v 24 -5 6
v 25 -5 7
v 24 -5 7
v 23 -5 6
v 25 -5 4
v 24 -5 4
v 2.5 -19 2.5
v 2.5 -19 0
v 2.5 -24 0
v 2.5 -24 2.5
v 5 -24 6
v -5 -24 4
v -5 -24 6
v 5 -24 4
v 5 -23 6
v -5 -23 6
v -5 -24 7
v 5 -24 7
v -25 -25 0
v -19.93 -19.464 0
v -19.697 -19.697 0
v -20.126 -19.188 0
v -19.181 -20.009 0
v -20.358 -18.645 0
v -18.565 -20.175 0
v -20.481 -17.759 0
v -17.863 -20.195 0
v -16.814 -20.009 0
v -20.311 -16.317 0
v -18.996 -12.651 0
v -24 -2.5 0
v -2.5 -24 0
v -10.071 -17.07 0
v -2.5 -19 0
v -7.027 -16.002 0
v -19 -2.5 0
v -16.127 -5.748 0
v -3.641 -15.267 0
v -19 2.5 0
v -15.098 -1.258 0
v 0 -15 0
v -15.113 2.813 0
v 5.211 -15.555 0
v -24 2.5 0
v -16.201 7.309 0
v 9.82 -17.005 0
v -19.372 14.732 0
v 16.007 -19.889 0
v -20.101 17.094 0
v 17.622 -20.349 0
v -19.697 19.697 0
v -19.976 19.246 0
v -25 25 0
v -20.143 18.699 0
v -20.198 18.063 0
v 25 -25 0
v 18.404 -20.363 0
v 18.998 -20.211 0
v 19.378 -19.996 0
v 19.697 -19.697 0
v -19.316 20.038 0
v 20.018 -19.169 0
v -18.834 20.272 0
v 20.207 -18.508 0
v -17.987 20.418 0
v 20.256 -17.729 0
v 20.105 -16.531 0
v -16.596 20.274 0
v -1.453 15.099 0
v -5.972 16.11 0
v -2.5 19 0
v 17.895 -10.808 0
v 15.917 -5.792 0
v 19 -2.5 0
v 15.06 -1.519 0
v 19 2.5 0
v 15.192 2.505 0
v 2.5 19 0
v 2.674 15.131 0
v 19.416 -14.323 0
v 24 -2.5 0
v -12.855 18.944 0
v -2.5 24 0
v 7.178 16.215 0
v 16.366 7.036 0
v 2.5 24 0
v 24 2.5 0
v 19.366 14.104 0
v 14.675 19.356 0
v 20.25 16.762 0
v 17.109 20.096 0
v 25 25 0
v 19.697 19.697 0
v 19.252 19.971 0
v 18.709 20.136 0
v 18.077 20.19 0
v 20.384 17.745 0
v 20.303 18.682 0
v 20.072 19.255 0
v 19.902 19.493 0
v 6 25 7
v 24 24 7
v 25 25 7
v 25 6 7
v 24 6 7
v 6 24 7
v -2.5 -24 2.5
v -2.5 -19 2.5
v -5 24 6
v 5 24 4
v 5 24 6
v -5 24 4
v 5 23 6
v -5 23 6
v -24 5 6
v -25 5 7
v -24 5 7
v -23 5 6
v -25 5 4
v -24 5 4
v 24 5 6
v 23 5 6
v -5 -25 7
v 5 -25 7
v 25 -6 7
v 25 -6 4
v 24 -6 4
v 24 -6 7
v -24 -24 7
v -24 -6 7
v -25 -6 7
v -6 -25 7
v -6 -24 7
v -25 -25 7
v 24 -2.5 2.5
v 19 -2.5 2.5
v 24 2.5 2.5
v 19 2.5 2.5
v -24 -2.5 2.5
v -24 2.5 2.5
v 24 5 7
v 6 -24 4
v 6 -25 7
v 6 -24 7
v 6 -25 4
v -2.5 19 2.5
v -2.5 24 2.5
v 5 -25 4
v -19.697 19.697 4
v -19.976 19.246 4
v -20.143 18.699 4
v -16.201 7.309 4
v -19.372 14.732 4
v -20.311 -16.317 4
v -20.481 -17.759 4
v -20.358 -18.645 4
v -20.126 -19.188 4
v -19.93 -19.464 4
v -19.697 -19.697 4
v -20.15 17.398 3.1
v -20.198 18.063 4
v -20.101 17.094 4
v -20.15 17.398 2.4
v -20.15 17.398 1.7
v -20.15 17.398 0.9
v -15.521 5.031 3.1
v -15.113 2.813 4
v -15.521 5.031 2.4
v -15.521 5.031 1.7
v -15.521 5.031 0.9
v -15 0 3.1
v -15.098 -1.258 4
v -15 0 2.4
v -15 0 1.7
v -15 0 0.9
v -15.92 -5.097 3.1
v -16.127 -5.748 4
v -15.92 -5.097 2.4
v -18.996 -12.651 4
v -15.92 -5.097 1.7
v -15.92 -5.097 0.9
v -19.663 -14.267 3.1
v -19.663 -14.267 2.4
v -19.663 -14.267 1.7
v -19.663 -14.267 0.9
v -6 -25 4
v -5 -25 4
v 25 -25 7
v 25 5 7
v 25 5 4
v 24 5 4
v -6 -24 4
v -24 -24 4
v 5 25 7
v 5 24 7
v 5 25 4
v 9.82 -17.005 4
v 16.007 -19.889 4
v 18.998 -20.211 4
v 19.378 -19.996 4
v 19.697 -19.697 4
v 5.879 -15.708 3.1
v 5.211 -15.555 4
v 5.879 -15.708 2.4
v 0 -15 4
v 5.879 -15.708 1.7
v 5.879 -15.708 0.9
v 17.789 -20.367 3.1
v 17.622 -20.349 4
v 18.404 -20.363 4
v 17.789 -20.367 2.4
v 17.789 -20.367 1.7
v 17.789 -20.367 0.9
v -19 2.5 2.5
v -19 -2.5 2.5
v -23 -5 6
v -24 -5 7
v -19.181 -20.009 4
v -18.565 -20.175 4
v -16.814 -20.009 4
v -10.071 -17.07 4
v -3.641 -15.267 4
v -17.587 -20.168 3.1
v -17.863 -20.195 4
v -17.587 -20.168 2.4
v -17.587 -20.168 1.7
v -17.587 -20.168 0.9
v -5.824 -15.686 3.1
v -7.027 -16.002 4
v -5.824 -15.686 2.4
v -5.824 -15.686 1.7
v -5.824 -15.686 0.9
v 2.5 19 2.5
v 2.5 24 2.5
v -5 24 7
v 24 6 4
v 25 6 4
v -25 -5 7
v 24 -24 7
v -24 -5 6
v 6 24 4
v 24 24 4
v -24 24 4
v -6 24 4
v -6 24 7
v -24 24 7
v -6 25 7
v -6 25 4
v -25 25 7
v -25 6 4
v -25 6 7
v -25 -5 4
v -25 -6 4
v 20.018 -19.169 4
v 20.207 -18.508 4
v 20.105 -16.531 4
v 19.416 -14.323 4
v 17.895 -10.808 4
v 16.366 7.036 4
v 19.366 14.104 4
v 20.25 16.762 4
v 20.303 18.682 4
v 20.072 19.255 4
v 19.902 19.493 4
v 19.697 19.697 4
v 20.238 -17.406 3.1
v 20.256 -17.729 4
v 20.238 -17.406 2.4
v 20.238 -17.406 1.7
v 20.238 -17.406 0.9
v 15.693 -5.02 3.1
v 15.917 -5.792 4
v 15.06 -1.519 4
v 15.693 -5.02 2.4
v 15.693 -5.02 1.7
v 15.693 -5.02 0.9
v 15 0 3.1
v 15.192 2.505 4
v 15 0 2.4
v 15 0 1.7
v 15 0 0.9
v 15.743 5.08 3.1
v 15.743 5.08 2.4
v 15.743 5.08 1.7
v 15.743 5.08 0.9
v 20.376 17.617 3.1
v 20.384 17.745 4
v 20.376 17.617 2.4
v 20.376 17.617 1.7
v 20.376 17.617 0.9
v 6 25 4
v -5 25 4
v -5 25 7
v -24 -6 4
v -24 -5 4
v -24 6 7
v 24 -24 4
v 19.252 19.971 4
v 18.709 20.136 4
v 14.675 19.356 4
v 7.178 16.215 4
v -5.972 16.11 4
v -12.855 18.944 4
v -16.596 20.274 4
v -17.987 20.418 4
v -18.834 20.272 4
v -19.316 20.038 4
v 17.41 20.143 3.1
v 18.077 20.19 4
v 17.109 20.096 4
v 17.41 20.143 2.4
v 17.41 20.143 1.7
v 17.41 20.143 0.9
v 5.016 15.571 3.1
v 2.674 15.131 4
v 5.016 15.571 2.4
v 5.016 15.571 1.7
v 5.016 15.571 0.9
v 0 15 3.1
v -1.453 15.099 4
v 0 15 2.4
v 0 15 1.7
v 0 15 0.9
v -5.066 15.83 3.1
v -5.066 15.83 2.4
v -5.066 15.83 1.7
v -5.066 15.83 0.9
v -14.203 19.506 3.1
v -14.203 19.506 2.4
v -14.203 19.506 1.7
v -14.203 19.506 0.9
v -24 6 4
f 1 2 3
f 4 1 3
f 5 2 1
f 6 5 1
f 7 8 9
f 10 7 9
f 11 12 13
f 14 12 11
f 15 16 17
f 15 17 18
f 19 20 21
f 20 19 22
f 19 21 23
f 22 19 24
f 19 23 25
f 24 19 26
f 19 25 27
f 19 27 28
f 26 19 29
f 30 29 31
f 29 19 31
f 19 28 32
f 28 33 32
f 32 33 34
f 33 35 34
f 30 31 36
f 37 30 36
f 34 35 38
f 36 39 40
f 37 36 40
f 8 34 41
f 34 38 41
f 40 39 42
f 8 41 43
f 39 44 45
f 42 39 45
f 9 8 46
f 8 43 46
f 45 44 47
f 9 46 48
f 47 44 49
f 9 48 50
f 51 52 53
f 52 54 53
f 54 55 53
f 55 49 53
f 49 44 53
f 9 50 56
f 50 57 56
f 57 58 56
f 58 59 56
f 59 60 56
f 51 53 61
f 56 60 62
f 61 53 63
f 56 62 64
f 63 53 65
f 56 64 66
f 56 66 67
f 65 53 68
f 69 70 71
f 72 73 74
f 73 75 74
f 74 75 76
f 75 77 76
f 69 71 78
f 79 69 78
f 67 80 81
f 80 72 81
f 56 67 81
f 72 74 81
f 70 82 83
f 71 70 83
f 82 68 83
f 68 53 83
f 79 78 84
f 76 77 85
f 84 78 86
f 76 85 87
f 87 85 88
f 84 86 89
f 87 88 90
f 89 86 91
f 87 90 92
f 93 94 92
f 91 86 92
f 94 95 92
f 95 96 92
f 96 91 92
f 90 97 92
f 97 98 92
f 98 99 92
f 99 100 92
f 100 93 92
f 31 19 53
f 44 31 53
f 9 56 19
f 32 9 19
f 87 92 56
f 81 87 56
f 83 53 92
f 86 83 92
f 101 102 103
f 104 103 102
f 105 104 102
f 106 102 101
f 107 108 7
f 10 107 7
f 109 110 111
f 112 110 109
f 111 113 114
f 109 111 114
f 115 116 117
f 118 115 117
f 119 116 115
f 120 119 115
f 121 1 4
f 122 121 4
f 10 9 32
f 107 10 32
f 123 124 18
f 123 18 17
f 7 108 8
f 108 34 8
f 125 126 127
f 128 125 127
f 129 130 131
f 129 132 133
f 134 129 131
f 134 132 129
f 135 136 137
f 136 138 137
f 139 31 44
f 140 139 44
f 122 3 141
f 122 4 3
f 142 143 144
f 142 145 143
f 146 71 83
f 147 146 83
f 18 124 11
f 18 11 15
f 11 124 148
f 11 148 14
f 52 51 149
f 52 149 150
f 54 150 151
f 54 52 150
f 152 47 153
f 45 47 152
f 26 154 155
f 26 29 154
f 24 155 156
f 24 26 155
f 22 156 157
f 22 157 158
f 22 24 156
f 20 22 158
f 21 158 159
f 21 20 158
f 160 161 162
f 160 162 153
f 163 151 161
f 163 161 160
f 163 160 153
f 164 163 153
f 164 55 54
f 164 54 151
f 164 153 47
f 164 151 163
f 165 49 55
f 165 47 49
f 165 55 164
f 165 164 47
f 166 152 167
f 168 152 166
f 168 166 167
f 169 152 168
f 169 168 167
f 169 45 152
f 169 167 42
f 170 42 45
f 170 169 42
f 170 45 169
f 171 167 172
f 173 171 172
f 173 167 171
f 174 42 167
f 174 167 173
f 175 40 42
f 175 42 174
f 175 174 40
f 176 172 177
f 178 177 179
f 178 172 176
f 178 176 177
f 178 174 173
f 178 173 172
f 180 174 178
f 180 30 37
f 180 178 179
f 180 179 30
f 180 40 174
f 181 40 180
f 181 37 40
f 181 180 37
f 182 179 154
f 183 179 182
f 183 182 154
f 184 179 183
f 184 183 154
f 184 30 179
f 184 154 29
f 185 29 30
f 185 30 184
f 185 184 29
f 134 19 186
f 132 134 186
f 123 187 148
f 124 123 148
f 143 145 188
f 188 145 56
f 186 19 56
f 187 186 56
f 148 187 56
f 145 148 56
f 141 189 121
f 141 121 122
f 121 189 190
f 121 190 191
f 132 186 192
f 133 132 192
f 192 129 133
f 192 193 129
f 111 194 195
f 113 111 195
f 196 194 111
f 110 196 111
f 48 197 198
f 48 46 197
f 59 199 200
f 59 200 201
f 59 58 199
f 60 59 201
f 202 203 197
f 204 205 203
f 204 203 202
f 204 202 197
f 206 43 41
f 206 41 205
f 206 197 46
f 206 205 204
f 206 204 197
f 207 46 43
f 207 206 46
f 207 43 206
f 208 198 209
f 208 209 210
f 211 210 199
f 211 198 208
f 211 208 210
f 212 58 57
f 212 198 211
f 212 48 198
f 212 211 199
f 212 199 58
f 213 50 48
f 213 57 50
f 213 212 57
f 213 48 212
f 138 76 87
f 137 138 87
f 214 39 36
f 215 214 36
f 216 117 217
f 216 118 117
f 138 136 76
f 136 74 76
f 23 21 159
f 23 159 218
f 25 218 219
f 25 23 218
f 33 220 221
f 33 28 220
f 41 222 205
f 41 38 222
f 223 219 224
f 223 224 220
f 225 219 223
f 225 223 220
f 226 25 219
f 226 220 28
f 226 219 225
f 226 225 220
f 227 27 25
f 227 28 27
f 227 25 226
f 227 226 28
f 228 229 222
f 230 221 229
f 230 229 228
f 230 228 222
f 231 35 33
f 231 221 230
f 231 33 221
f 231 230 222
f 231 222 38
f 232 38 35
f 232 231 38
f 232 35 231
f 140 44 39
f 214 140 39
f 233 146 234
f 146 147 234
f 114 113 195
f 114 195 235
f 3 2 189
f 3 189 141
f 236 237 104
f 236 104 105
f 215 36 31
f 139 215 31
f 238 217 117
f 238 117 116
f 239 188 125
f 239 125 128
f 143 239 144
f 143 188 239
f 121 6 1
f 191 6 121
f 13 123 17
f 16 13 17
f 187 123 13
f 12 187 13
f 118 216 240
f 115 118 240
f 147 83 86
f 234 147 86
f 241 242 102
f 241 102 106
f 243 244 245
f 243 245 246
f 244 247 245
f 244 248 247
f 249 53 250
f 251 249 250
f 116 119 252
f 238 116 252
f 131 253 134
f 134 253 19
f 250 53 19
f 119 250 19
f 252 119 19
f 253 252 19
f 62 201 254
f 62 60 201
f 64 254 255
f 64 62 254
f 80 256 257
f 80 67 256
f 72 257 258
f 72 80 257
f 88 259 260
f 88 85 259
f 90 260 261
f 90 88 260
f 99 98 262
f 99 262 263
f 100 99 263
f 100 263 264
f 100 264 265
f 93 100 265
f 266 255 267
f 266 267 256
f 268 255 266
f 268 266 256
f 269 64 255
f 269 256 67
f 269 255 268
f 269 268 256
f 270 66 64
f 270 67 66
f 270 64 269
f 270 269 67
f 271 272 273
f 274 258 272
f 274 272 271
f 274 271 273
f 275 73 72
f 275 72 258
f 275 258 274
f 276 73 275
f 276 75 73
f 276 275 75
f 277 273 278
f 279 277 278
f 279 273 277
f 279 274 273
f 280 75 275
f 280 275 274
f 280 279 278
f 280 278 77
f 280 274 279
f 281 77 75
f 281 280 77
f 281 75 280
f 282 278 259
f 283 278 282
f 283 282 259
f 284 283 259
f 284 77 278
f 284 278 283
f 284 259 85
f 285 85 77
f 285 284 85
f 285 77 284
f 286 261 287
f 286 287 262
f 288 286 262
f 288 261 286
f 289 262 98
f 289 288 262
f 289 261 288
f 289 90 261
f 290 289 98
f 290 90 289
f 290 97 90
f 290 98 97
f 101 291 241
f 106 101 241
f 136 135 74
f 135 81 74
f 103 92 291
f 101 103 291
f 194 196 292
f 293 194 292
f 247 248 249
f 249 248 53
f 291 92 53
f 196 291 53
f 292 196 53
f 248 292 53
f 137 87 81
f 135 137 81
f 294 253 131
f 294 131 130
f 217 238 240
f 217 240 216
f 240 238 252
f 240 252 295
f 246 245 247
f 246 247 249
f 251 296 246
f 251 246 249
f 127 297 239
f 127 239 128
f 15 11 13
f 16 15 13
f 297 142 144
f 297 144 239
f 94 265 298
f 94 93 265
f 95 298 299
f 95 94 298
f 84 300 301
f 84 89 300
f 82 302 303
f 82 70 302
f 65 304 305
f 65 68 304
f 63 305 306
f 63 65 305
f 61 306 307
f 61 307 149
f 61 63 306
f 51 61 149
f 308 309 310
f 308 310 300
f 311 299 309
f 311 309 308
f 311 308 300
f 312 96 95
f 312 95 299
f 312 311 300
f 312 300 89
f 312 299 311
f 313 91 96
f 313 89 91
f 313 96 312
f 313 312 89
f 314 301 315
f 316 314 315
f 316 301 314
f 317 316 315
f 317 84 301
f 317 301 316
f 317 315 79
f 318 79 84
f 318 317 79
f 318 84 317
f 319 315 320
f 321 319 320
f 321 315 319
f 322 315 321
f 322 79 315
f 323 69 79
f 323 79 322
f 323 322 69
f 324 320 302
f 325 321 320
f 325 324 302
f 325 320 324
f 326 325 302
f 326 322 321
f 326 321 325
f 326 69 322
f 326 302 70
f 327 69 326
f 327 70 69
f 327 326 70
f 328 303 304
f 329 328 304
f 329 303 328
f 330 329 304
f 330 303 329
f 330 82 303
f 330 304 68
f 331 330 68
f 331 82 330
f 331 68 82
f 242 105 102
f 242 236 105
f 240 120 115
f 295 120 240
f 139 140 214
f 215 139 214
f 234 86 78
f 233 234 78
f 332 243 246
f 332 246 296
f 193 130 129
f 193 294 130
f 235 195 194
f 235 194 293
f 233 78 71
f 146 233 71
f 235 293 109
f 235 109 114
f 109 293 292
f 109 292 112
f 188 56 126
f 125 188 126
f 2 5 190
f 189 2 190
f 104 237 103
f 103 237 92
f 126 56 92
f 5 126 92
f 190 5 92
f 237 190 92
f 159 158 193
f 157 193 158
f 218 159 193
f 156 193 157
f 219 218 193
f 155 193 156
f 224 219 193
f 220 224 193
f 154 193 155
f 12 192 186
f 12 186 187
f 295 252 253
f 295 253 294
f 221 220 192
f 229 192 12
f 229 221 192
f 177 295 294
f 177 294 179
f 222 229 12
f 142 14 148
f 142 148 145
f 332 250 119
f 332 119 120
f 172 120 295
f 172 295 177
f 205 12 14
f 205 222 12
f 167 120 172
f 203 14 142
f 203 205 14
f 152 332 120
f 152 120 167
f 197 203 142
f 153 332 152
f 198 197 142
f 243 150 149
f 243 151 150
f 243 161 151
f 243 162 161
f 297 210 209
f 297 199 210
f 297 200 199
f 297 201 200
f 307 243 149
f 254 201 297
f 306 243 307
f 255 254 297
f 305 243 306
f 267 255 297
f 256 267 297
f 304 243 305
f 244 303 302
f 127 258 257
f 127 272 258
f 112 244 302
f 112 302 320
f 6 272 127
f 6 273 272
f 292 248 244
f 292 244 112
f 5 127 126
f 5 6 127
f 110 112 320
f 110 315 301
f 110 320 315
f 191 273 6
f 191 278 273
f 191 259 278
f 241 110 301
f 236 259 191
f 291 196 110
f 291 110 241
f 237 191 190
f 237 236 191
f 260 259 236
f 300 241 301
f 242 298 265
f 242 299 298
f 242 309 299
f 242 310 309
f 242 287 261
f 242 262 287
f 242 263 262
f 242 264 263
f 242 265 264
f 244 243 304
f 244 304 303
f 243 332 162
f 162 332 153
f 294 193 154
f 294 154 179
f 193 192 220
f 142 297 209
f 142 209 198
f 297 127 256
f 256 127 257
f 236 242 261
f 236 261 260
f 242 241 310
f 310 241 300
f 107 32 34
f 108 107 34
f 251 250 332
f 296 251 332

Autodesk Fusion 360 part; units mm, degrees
sketch "Skizze1" plane through (0, 0, 0) normal (0, 0, 1) x (1, 0, 0)
  line L0 (25, 25) -> (-25, 25)
  line L1 (-25, 25) -> (-25, -25)
  line L2 (-25, -25) -> (25, -25)
  line L3 (25, -25) -> (25, 25)
  line L4 (25, 25) -> (-25, -25) construction
  line L5 (-25, 25) -> (25, -25) construction
  line L6 (0, 25) -> (0, 21.5) construction
  circle A0 centre (0, 21.5) radius 2.5
  circle A1 centre (-21.5, 0) radius 2.5
  circle A2 centre (0, -21.5) radius 2.5
  circle A3 centre (21.5, 0) radius 2.5
  line L7 (-25, 25) -> (-19.6967, 19.6967)
  line L8 (25, 25) -> (19.6967, 19.6967)
  line L9 (25, -25) -> (19.6967, -19.6967)
  line L10 (-25, -25) -> (-19.6967, -19.6967)
  line L11 (0, 25) -> (0, 15) construction
  line L12 (25, 0) -> (15, 0) construction
  line L13 (0, -25) -> (0, -15) construction
  line L14 (-25, 0) -> (-15, 0) construction
  spline S0 degree 5 poles (0, -15) (1.2065, -15) (3.6254, -15.1465) (7.1572, -15.8132) (11.2047, -17.4413) (15.1309, -19.6326) (18.0012, -20.8352) (20.0511, -20.1301) (20.6752, -17.6735) (19.5115, -14.1604) (17.3962, -9.8731) (15.4021, -5.0946) (14.5897, -0.0184) (15.4512, 5.1337) (17.4986, 10.0731) (19.6685, 14.4705) (20.838, 17.9349) (20.126, 20.1337) (17.6793, 20.5662) (14.1665, 19.2783) (9.8729, 17.155) (5.088, 15.2723) (0.0153, 14.6011) (-5.1205, 15.5565) (-10.0405, 17.6249) (-14.4307, 19.7595) (-17.9076, 20.8718) (-20.1386, 20.1183) (-20.5833, 17.6619) (-19.2644, 14.1613) (-17.1004, 9.8864) (-15.2073, 5.1088) (-14.5882, 0.0204) (-15.6493, -5.152) (-17.8106, -10.1075) (-19.9406, -14.5038) (-20.9509, -17.9505) (-20.0386, -20.1219) (-17.7519, -20.5757) (-14.8416, -19.3727) (-11.0208, -17.3175) (-7.0919, -15.7983) (-3.6135, -15.1465) (-1.2065, -15) (0, -15) knots 0 0 0 0 0 0 0.025 0.05 0.075 0.1 0.125 0.15 0.175 0.2 0.225 0.25 0.275 0.3 0.325 0.35 0.375 0.4 0.425 0.45 0.475 0.5 0.525 0.55 0.575 0.6 0.625 0.65 0.675 0.7 0.725 0.75 0.775 0.8 0.825 0.85 0.875 0.9 0.925 0.95 0.975 1 1 1 1 1 1
  line L15 (-21.5565, -18.1362) -> (-17.8369, -21.2572)
  line L16 (-8.8743, -15) -> (8.8743, -15)
  line L17 (21.5565, 18.1362) -> (17.8369, 21.2572)
  line L18 (18.1362, -21.5565) -> (21.2572, -17.8369)
  line L19 (-18.1127, 21.5869) -> (-21.2807, 17.8065)
  line L20 (2.5, 19) -> (-2.5, 19)
  line L21 (-2.5, 19) -> (-2.5, 24)
  line L22 (-2.5, 24) -> (2.5, 24)
  line L23 (2.5, 24) -> (2.5, 19)
  line L24 (2.5, 19) -> (-2.5, 24) construction
  line L25 (-2.5, 19) -> (2.5, 24) construction
  line L26 (-19, 2.5) -> (-19, -2.5)
  line L27 (-24, 2.5) -> (-19, 2.5)
  line L28 (-24, -2.5) -> (-24, 2.5)
  line L29 (-19, -2.5) -> (-24, -2.5)
  line L30 (-2.5, -19) -> (2.5, -19)
  line L31 (-2.5, -24) -> (-2.5, -19)
  line L32 (2.5, -24) -> (-2.5, -24)
  line L33 (2.5, -19) -> (2.5, -24)
  line L34 (19, -2.5) -> (19, 2.5)
  line L35 (24, -2.5) -> (19, -2.5)
  line L36 (24, 2.5) -> (24, -2.5)
  line L37 (19, 2.5) -> (24, 2.5)
  point P0 (0, 21.5)
  dimension "d1" = 50
  dimension "d2" = 50
  dimension "d4" = 5
  dimension "d6" = 360
  dimension "d7" = 7.5
  dimension "d8" = 7.5
  dimension "d9" = 7.5
  dimension "d10" = 7.5
  dimension "d11" = 10
  dimension "d12" = 10
  dimension "d13" = 10
  dimension "d14" = 10
  dimension "d39" = 5
  dimension "d40" = 5
  dimension "d42" = 360
  dimension "d43" = 3.5
extrude "Extrusion1" add sketch "Skizze1" along normal blind 4 contours L0 L7 L8 S0 | L3 L8 L9 S0 | L1 L7 L10 S0 | L2 L9 L10 S0 | A0 | A0 L20 L23 | A0 L22 L23 | A0 L21 L22 | A0 L20 L21 | A1 | A1 L26 L29 | A1 L26 L27 | A1 L27 L28 | A1 L28 L29 | A2 | A2 L32 L33 | A2 L30 L33 | A2 L30 L31 | A2 L31 L32 | A3 | A3 L35 L36 | A3 L36 L37 | A3 L34 L37 | A3 L34 L35
sketch "Skizze9" plane through (0, 0, 4) normal (0, 0, 1) x (-1, 0, 0)
  spline S0 degree 5 poles (0, 15) (1.2065, 15) (3.6135, 15.1465) (7.0919, 15.7983) (11.0208, 17.3175) (14.8416, 19.3727) (17.7519, 20.5757) (20.0386, 20.1219) (20.9509, 17.9505) (19.9406, 14.5038) (17.8106, 10.1075) (15.6493, 5.152) (14.5882, -0.0204) (15.2073, -5.1088) (17.1004, -9.8864) (19.2644, -14.1613) (20.5833, -17.6619) (20.1386, -20.1183) (17.9076, -20.8718) (14.4307, -19.7595) (10.0405, -17.6249) (5.1205, -15.5565) (-0.0153, -14.6011) (-5.088, -15.2723) (-9.8729, -17.155) (-14.1665, -19.2783) (-17.6793, -20.5662) (-20.126, -20.1337) (-20.838, -17.9349) (-19.6685, -14.4705) (-17.4986, -10.0731) (-15.4512, -5.1337) (-14.5897, 0.0184) (-15.4021, 5.0946) (-17.3962, 9.8731) (-19.5115, 14.1604) (-20.6752, 17.6735) (-20.0511, 20.1301) (-18.0012, 20.8352) (-15.1309, 19.6326) (-11.2047, 17.4413) (-7.1572, 15.8132) (-3.6254, 15.1465) (-1.2065, 15) (0, 15) knots -1 -1 -1 -1 -1 -1 -0.975 -0.95 -0.925 -0.9 -0.875 -0.85 -0.825 -0.8 -0.775 -0.75 -0.725 -0.7 -0.675 -0.65 -0.625 -0.6 -0.575 -0.55 -0.525 -0.5 -0.475 -0.45 -0.425 -0.4 -0.375 -0.35 -0.325 -0.3 -0.275 -0.25 -0.225 -0.2 -0.175 -0.15 -0.125 -0.1 -0.075 -0.05 -0.025 0 0 0 0 0 0
  line L0 (-25, 25) -> (-25, -25)
  line L1 (-25, -25) -> (25, -25)
  line L2 (25, -25) -> (25, 25)
  line L3 (25, 25) -> (-25, 25)
  line L4 (24, 24) -> (-24, 24)
  line L5 (-24, 24) -> (-24, -24)
  line L6 (-24, -24) -> (24, -24)
  line L7 (24, -24) -> (24, 24)
  line L8 (0, -25) -> (-5, -25)
  line L9 (-5, -25) -> (-5, -24)
  line L10 (-5, -25) -> (-6, -25)
  line L11 (-6, -25) -> (-6, -24)
  line L12 (0, -25) -> (0, -24) construction
  line L13 (6, -25) -> (6, -24)
  line L14 (5, -25) -> (5, -24)
  line L15 (5, -24) -> (-5, -24)
  line L16 (-5, -24) -> (-5, -23)
  line L17 (-5, -23) -> (5, -23)
  line L18 (5, -23) -> (5, -24)
  line L19 (25, 6) -> (24, 6)
  line L20 (25, 5) -> (24, 5)
  line L21 (23, 5) -> (24, 5)
  line L22 (23, -5) -> (23, 5)
  line L23 (25, -5) -> (24, -5)
  line L24 (25, -6) -> (24, -6)
  line L25 (24, -5) -> (23, -5)
  line L26 (-6, 25) -> (-6, 24)
  line L27 (-5, 25) -> (-5, 24)
  line L28 (-5, 23) -> (-5, 24)
  line L29 (5, 23) -> (-5, 23)
  line L30 (5, 25) -> (5, 24)
  line L31 (6, 25) -> (6, 24)
  line L32 (5, 24) -> (5, 23)
  line L33 (-25, -6) -> (-24, -6)
  line L34 (-25, -5) -> (-24, -5)
  line L35 (-23, -5) -> (-24, -5)
  line L36 (-23, 5) -> (-23, -5)
  line L37 (-25, 5) -> (-24, 5)
  line L38 (-25, 6) -> (-24, 6)
  line L39 (-24, 5) -> (-23, 5)
  dimension "d65" = -1
  dimension "d66" = 5
  dimension "d67" = 1
  dimension "d70" = 0
  dimension "d71" = 0
  dimension "d72" = 10
  dimension "d73" = 1
  dimension "d75" = 360
extrude "Extrusion12" add sketch "Skizze9" along normal blind 3 contours L0 L3 L4 L5 L26 L38 | L0 L5 L34 L37 | L3 L4 L27 L30 | L5 L35 L36 L39 | L4 L28 L29 L32 | L0 L1 L5 L6 L11 L33 | L2 L3 L4 L7 L19 L31 | L1 L6 L8 L9 L14 L15 | L2 L7 L20 L23 | L6 L15 L16 L17 L18 | L7 L21 L22 L25 | L1 L2 L6 L7 L13 L24
extrude "Extrusion13" cut sketch "Skizze9" along normal blind 2 contours L5 L35 L36 L39 | L4 L28 L29 L32 | L6 L15 L16 L17 L18 | L7 L21 L22 L25
chamfer "Fase1" distance 1 angle 45 4 edges at (23, 0, 7) (0, -23, 7) (-23, 0, 7) (0, 23, 7)
extrude "Extrusion14" cut sketch "Skizze1" along normal blind 2.5 contours A0 | A0 L20 L23 | A0 L22 L23 | A0 L21 L22 | A0 L20 L21 | A1 | A1 L26 L29 | A1 L26 L27 | A1 L27 L28 | A1 L28 L29 | A2 | A2 L32 L33 | A2 L30 L33 | A2 L30 L31 | A2 L31 L32 | A3 | A3 L35 L36 | A3 L36 L37 | A3 L34 L37 | A3 L34 L35
